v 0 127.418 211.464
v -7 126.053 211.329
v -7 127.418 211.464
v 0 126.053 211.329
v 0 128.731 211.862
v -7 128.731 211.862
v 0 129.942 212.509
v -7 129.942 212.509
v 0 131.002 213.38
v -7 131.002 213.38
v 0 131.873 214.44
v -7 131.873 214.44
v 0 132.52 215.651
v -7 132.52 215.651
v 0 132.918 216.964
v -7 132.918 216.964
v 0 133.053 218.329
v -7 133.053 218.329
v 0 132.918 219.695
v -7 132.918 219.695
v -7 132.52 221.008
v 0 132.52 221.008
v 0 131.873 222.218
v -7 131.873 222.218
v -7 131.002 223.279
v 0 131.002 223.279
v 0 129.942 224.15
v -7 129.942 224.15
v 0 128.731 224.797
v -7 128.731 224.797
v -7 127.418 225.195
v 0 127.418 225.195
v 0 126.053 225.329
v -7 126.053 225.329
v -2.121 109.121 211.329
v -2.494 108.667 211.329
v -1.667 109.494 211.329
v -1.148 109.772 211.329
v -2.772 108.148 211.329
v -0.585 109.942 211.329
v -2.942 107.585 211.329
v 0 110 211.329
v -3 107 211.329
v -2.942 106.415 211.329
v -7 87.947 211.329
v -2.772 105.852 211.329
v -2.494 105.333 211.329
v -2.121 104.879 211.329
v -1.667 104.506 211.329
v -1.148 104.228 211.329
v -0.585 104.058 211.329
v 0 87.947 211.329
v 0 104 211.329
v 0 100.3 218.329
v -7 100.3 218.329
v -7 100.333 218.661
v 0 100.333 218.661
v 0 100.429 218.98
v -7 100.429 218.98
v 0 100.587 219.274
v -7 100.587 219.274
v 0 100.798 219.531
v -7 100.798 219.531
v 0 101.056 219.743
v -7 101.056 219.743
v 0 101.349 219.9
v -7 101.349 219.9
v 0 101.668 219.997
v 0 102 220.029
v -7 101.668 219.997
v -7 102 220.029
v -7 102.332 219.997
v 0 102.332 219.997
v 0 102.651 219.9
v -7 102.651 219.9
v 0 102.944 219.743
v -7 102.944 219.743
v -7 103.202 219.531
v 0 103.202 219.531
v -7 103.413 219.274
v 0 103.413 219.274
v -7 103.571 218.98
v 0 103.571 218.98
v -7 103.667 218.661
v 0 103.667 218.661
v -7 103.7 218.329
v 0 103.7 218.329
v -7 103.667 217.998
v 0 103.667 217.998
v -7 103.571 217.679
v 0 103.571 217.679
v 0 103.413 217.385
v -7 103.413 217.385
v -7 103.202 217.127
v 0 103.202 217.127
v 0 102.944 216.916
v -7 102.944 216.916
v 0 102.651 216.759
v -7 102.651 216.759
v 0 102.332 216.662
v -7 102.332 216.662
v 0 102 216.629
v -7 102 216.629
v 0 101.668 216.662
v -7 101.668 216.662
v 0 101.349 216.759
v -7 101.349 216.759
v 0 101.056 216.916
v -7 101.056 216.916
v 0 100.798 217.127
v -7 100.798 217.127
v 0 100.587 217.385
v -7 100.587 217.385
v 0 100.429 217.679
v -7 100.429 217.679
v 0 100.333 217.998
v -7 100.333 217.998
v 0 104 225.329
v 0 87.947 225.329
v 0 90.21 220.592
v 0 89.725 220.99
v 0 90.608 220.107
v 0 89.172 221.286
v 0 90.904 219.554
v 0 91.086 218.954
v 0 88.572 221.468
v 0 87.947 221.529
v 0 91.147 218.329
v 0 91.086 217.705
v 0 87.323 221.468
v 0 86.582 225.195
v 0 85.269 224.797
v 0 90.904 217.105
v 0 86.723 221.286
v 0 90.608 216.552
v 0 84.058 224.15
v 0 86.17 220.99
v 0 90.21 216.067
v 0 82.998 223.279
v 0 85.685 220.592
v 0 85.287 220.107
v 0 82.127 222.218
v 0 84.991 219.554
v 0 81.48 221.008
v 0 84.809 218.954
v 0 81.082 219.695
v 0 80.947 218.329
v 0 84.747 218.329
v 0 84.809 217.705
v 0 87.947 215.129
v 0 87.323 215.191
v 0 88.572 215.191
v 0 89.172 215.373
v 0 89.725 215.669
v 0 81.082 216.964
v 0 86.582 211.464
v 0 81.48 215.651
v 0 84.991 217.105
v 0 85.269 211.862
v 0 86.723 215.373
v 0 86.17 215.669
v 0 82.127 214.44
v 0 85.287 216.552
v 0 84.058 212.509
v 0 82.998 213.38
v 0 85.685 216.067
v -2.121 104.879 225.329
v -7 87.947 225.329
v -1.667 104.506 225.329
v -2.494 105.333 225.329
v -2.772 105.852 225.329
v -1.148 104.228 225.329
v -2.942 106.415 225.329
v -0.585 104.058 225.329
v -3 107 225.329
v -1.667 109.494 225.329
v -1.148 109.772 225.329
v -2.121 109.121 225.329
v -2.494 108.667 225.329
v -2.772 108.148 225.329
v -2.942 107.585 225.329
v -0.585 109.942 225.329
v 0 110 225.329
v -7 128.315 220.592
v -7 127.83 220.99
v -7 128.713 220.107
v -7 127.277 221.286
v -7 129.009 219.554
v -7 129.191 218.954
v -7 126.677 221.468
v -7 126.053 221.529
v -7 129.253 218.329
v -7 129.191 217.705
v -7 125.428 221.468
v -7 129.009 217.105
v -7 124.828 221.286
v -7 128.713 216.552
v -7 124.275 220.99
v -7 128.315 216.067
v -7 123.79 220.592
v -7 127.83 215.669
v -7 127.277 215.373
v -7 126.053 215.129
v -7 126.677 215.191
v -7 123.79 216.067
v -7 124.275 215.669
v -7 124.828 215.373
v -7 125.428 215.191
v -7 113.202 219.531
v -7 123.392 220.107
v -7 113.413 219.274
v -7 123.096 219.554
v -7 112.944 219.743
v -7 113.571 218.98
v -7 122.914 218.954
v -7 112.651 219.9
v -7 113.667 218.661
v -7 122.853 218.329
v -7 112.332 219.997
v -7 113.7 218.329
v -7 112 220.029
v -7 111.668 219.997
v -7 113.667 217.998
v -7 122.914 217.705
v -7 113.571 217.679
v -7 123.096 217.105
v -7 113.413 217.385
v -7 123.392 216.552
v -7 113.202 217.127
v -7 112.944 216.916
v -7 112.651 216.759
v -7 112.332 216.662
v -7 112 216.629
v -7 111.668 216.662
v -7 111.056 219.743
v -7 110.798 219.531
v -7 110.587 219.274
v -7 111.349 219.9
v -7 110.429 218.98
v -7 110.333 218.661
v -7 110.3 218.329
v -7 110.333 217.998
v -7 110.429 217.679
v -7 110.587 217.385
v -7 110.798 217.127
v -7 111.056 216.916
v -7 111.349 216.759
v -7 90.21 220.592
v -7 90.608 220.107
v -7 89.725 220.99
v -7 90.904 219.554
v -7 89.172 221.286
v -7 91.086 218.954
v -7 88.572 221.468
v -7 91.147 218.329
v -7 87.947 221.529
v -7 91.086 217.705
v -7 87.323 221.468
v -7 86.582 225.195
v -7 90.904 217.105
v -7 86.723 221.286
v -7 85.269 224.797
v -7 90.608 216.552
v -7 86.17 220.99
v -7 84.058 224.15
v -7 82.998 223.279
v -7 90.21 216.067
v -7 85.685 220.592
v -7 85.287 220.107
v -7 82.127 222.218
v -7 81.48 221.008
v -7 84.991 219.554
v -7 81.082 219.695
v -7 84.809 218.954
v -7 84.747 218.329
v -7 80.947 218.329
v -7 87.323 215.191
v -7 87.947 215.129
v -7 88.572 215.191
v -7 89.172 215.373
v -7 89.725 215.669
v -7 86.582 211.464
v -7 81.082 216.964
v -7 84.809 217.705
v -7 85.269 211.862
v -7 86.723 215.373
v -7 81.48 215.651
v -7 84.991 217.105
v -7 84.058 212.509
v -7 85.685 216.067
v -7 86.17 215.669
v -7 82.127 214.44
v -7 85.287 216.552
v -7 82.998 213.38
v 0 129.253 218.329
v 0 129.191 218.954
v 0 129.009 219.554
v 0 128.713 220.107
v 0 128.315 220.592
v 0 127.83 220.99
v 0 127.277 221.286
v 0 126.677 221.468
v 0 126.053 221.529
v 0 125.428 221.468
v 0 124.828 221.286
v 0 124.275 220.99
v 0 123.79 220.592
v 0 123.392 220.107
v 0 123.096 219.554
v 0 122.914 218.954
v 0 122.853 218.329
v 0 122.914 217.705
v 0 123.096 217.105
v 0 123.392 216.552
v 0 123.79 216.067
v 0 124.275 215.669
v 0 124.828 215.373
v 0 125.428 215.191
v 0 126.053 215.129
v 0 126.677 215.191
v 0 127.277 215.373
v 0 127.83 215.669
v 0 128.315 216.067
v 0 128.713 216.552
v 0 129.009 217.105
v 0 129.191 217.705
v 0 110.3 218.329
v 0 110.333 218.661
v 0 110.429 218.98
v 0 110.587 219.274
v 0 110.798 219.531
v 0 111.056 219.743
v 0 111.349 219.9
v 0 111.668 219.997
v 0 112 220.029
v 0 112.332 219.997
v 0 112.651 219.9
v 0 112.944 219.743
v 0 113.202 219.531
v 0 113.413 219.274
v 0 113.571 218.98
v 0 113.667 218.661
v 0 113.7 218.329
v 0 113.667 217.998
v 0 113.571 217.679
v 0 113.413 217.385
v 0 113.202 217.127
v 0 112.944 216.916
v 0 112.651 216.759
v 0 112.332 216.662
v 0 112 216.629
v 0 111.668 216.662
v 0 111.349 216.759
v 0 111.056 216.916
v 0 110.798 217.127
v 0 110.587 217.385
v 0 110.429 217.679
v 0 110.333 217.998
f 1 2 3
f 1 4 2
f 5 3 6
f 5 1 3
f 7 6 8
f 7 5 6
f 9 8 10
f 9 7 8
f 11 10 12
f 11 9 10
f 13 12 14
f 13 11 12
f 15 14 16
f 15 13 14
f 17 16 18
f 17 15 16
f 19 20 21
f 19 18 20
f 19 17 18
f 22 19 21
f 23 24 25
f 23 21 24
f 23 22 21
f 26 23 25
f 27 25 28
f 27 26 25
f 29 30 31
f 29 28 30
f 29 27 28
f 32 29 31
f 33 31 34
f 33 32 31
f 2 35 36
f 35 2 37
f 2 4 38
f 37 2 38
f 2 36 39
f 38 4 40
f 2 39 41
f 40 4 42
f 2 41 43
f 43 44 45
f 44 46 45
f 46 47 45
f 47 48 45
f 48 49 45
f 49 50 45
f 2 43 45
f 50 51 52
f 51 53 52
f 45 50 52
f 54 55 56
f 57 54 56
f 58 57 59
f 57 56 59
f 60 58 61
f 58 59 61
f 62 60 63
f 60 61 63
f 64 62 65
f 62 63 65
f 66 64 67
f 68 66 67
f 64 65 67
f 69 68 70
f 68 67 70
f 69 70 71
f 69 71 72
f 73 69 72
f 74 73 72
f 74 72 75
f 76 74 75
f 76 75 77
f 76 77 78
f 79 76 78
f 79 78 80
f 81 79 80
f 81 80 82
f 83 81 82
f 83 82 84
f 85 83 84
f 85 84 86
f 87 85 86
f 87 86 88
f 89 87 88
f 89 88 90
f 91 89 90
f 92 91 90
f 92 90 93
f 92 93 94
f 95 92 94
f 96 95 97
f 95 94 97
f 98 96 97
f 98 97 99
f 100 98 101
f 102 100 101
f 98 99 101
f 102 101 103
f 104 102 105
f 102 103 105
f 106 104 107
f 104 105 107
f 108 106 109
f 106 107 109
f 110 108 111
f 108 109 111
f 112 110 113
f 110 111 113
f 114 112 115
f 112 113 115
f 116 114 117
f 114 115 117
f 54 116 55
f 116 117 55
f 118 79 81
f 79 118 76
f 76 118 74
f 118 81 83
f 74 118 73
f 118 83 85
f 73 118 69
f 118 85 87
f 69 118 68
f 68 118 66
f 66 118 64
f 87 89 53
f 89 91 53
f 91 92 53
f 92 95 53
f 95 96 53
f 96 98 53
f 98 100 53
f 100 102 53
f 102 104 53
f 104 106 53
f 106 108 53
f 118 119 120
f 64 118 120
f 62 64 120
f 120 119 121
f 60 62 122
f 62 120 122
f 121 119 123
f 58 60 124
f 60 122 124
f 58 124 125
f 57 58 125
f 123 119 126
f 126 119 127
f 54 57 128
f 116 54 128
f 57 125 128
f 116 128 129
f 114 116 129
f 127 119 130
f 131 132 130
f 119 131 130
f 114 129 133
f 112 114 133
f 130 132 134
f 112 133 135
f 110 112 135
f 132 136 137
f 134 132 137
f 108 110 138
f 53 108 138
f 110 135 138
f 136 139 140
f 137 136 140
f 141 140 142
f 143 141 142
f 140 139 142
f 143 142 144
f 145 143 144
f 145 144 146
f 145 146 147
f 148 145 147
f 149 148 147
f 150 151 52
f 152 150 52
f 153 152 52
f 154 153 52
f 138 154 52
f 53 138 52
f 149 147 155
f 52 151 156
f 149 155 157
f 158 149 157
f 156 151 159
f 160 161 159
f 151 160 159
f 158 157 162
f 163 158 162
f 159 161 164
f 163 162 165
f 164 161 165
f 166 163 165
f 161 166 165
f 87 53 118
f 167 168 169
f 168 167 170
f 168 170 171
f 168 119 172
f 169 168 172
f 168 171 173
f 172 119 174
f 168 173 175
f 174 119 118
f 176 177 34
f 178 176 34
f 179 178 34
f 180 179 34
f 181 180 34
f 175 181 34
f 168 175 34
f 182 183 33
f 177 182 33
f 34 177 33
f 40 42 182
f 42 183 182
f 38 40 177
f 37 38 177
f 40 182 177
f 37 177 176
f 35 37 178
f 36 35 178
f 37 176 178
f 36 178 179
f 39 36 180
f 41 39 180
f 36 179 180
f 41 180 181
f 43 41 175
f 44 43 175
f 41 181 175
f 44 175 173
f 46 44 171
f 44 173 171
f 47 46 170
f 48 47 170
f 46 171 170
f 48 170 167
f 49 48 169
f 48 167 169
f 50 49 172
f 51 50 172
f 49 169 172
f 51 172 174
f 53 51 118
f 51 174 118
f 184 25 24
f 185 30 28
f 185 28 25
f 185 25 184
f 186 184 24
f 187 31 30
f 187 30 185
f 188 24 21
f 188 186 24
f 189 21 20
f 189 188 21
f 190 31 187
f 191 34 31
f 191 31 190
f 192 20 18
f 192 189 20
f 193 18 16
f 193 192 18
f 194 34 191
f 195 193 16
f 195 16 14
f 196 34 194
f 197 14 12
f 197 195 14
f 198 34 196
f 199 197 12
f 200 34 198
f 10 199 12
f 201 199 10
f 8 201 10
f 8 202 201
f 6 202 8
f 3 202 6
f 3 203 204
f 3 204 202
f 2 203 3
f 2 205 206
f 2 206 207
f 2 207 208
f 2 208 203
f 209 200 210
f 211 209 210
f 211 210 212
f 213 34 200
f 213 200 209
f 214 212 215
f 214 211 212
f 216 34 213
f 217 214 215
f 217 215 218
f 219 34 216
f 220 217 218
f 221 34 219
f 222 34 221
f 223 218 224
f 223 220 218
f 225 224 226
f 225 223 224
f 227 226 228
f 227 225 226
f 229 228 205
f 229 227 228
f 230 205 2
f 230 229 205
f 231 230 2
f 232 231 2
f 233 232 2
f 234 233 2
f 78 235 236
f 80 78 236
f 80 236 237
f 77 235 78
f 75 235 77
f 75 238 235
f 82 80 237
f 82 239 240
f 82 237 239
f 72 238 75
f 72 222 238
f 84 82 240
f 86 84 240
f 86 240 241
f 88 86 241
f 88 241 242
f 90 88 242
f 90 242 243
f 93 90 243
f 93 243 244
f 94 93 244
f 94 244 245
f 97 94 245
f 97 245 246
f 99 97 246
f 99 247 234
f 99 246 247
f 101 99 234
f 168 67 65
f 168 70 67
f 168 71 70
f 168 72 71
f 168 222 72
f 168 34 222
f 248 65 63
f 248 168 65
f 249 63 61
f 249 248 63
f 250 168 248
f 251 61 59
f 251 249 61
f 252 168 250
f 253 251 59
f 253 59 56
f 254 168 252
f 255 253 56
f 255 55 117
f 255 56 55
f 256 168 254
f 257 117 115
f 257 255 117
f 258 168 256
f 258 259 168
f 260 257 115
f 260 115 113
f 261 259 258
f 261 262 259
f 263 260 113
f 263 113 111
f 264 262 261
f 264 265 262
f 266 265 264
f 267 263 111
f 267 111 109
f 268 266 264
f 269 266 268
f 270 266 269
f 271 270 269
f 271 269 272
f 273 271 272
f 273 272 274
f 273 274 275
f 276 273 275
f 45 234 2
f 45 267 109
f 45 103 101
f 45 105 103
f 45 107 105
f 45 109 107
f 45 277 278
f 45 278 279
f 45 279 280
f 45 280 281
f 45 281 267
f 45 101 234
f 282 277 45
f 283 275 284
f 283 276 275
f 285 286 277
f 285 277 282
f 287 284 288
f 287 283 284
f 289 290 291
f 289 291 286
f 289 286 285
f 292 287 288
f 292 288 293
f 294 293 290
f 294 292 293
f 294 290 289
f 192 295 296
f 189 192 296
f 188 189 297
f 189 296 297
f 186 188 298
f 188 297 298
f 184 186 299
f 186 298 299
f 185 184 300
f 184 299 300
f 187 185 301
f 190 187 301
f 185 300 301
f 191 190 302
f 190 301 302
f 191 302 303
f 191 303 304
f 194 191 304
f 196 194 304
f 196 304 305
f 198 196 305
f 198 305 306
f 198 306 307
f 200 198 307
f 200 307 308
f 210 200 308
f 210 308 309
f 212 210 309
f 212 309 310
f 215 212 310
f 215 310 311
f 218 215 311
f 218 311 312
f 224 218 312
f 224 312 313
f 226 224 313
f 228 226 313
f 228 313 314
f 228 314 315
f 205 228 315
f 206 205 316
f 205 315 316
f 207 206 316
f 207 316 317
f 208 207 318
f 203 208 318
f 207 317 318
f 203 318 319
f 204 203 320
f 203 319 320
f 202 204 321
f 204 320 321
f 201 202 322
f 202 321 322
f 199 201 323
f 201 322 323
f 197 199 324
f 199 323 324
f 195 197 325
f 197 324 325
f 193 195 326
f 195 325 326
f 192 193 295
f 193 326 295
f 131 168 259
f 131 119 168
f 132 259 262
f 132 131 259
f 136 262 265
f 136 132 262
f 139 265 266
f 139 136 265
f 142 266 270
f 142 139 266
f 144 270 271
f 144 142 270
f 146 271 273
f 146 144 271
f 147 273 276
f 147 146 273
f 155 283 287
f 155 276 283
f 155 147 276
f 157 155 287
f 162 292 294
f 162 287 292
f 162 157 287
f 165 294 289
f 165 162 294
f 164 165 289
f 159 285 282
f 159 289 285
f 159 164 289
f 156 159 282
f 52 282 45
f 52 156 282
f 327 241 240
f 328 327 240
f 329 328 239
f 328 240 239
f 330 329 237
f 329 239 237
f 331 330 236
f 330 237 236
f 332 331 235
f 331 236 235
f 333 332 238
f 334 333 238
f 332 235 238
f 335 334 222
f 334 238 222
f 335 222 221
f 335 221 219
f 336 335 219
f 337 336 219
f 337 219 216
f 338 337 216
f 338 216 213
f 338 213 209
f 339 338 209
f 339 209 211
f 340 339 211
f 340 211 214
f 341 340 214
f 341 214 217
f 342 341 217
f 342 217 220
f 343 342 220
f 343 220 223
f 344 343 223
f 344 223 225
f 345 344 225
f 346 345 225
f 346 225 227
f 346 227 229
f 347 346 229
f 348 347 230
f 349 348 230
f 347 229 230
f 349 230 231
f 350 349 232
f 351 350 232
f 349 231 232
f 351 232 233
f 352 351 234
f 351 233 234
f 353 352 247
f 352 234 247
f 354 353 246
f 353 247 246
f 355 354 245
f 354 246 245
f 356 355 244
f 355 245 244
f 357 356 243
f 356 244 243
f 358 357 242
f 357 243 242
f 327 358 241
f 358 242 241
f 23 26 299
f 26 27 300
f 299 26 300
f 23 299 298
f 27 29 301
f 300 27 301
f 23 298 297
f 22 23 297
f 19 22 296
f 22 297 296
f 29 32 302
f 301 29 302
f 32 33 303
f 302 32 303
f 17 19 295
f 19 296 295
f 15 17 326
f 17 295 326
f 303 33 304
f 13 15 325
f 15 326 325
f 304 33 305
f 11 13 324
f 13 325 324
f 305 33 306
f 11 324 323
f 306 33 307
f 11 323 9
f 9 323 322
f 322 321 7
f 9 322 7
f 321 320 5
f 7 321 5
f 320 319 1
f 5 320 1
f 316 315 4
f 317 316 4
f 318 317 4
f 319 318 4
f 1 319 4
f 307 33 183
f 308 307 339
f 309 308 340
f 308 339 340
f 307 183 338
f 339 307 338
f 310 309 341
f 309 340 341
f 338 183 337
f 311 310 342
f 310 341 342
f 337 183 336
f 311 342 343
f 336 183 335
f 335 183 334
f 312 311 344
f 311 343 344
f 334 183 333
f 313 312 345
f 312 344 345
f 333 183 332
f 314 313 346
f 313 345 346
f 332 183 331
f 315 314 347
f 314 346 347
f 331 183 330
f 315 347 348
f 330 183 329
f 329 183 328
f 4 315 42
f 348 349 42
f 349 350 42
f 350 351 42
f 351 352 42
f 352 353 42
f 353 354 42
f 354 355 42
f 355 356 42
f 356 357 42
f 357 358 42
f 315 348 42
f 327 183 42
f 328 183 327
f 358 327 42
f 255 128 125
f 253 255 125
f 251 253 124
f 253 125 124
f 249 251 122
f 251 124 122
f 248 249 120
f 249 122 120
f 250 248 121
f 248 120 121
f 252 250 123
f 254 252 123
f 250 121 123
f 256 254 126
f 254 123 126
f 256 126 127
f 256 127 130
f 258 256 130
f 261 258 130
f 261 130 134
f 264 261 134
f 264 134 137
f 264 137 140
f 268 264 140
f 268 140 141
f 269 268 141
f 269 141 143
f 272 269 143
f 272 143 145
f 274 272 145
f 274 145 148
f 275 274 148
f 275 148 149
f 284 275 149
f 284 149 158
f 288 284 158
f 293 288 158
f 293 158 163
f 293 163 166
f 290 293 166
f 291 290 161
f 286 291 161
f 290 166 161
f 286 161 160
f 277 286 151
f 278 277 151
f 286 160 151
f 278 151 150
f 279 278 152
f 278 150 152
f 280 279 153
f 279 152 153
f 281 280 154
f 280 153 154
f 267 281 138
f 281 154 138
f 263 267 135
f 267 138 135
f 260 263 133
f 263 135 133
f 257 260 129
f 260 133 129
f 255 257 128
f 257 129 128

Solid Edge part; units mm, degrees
sketch "Sketch1" plane through (0, 0, 0) normal (1, 0, 0) x (0, 1, 0)
  circle A0 centre (126.0526, 218.3294) radius 3.2
  line L0 (87.9474, 225.3294) -> (126.0526, 225.3294)
  line L1 (126.0526, 211.3294) -> (87.9474, 211.3294)
  arc A1 (87.9474, 211.3294) -> (87.9474, 225.3294) centre (87.9474, 218.3294) cw
  arc A2 (126.0526, 225.3294) -> (126.0526, 211.3294) centre (126.0526, 218.3294) cw
  circle A3 centre (87.9474, 218.3294) radius 3.2
extrude "Protrusion1" add sketch "Sketch1" against normal blind 7
sketch "Sketch2" plane through (-4, 107, 225.3294) normal (0, 0, 1) x (1, 0, 0)
  circle A0 centre (4, 0) radius 3
extrude "Cutout1" cut sketch "Sketch2" against normal through all
sketch "Sketch3" plane through (-7, 107, 218.3294) normal (-1, 0, 0) x (0, -1, 0)
  circle A0 centre (-5, 0) radius 1.7
  circle A1 centre (5, 0) radius 1.7
  dimension "D1" = 5
extrude "Cutout2" cut sketch "Sketch3" against normal through all
properties material "ABS Plastic, high impact"
